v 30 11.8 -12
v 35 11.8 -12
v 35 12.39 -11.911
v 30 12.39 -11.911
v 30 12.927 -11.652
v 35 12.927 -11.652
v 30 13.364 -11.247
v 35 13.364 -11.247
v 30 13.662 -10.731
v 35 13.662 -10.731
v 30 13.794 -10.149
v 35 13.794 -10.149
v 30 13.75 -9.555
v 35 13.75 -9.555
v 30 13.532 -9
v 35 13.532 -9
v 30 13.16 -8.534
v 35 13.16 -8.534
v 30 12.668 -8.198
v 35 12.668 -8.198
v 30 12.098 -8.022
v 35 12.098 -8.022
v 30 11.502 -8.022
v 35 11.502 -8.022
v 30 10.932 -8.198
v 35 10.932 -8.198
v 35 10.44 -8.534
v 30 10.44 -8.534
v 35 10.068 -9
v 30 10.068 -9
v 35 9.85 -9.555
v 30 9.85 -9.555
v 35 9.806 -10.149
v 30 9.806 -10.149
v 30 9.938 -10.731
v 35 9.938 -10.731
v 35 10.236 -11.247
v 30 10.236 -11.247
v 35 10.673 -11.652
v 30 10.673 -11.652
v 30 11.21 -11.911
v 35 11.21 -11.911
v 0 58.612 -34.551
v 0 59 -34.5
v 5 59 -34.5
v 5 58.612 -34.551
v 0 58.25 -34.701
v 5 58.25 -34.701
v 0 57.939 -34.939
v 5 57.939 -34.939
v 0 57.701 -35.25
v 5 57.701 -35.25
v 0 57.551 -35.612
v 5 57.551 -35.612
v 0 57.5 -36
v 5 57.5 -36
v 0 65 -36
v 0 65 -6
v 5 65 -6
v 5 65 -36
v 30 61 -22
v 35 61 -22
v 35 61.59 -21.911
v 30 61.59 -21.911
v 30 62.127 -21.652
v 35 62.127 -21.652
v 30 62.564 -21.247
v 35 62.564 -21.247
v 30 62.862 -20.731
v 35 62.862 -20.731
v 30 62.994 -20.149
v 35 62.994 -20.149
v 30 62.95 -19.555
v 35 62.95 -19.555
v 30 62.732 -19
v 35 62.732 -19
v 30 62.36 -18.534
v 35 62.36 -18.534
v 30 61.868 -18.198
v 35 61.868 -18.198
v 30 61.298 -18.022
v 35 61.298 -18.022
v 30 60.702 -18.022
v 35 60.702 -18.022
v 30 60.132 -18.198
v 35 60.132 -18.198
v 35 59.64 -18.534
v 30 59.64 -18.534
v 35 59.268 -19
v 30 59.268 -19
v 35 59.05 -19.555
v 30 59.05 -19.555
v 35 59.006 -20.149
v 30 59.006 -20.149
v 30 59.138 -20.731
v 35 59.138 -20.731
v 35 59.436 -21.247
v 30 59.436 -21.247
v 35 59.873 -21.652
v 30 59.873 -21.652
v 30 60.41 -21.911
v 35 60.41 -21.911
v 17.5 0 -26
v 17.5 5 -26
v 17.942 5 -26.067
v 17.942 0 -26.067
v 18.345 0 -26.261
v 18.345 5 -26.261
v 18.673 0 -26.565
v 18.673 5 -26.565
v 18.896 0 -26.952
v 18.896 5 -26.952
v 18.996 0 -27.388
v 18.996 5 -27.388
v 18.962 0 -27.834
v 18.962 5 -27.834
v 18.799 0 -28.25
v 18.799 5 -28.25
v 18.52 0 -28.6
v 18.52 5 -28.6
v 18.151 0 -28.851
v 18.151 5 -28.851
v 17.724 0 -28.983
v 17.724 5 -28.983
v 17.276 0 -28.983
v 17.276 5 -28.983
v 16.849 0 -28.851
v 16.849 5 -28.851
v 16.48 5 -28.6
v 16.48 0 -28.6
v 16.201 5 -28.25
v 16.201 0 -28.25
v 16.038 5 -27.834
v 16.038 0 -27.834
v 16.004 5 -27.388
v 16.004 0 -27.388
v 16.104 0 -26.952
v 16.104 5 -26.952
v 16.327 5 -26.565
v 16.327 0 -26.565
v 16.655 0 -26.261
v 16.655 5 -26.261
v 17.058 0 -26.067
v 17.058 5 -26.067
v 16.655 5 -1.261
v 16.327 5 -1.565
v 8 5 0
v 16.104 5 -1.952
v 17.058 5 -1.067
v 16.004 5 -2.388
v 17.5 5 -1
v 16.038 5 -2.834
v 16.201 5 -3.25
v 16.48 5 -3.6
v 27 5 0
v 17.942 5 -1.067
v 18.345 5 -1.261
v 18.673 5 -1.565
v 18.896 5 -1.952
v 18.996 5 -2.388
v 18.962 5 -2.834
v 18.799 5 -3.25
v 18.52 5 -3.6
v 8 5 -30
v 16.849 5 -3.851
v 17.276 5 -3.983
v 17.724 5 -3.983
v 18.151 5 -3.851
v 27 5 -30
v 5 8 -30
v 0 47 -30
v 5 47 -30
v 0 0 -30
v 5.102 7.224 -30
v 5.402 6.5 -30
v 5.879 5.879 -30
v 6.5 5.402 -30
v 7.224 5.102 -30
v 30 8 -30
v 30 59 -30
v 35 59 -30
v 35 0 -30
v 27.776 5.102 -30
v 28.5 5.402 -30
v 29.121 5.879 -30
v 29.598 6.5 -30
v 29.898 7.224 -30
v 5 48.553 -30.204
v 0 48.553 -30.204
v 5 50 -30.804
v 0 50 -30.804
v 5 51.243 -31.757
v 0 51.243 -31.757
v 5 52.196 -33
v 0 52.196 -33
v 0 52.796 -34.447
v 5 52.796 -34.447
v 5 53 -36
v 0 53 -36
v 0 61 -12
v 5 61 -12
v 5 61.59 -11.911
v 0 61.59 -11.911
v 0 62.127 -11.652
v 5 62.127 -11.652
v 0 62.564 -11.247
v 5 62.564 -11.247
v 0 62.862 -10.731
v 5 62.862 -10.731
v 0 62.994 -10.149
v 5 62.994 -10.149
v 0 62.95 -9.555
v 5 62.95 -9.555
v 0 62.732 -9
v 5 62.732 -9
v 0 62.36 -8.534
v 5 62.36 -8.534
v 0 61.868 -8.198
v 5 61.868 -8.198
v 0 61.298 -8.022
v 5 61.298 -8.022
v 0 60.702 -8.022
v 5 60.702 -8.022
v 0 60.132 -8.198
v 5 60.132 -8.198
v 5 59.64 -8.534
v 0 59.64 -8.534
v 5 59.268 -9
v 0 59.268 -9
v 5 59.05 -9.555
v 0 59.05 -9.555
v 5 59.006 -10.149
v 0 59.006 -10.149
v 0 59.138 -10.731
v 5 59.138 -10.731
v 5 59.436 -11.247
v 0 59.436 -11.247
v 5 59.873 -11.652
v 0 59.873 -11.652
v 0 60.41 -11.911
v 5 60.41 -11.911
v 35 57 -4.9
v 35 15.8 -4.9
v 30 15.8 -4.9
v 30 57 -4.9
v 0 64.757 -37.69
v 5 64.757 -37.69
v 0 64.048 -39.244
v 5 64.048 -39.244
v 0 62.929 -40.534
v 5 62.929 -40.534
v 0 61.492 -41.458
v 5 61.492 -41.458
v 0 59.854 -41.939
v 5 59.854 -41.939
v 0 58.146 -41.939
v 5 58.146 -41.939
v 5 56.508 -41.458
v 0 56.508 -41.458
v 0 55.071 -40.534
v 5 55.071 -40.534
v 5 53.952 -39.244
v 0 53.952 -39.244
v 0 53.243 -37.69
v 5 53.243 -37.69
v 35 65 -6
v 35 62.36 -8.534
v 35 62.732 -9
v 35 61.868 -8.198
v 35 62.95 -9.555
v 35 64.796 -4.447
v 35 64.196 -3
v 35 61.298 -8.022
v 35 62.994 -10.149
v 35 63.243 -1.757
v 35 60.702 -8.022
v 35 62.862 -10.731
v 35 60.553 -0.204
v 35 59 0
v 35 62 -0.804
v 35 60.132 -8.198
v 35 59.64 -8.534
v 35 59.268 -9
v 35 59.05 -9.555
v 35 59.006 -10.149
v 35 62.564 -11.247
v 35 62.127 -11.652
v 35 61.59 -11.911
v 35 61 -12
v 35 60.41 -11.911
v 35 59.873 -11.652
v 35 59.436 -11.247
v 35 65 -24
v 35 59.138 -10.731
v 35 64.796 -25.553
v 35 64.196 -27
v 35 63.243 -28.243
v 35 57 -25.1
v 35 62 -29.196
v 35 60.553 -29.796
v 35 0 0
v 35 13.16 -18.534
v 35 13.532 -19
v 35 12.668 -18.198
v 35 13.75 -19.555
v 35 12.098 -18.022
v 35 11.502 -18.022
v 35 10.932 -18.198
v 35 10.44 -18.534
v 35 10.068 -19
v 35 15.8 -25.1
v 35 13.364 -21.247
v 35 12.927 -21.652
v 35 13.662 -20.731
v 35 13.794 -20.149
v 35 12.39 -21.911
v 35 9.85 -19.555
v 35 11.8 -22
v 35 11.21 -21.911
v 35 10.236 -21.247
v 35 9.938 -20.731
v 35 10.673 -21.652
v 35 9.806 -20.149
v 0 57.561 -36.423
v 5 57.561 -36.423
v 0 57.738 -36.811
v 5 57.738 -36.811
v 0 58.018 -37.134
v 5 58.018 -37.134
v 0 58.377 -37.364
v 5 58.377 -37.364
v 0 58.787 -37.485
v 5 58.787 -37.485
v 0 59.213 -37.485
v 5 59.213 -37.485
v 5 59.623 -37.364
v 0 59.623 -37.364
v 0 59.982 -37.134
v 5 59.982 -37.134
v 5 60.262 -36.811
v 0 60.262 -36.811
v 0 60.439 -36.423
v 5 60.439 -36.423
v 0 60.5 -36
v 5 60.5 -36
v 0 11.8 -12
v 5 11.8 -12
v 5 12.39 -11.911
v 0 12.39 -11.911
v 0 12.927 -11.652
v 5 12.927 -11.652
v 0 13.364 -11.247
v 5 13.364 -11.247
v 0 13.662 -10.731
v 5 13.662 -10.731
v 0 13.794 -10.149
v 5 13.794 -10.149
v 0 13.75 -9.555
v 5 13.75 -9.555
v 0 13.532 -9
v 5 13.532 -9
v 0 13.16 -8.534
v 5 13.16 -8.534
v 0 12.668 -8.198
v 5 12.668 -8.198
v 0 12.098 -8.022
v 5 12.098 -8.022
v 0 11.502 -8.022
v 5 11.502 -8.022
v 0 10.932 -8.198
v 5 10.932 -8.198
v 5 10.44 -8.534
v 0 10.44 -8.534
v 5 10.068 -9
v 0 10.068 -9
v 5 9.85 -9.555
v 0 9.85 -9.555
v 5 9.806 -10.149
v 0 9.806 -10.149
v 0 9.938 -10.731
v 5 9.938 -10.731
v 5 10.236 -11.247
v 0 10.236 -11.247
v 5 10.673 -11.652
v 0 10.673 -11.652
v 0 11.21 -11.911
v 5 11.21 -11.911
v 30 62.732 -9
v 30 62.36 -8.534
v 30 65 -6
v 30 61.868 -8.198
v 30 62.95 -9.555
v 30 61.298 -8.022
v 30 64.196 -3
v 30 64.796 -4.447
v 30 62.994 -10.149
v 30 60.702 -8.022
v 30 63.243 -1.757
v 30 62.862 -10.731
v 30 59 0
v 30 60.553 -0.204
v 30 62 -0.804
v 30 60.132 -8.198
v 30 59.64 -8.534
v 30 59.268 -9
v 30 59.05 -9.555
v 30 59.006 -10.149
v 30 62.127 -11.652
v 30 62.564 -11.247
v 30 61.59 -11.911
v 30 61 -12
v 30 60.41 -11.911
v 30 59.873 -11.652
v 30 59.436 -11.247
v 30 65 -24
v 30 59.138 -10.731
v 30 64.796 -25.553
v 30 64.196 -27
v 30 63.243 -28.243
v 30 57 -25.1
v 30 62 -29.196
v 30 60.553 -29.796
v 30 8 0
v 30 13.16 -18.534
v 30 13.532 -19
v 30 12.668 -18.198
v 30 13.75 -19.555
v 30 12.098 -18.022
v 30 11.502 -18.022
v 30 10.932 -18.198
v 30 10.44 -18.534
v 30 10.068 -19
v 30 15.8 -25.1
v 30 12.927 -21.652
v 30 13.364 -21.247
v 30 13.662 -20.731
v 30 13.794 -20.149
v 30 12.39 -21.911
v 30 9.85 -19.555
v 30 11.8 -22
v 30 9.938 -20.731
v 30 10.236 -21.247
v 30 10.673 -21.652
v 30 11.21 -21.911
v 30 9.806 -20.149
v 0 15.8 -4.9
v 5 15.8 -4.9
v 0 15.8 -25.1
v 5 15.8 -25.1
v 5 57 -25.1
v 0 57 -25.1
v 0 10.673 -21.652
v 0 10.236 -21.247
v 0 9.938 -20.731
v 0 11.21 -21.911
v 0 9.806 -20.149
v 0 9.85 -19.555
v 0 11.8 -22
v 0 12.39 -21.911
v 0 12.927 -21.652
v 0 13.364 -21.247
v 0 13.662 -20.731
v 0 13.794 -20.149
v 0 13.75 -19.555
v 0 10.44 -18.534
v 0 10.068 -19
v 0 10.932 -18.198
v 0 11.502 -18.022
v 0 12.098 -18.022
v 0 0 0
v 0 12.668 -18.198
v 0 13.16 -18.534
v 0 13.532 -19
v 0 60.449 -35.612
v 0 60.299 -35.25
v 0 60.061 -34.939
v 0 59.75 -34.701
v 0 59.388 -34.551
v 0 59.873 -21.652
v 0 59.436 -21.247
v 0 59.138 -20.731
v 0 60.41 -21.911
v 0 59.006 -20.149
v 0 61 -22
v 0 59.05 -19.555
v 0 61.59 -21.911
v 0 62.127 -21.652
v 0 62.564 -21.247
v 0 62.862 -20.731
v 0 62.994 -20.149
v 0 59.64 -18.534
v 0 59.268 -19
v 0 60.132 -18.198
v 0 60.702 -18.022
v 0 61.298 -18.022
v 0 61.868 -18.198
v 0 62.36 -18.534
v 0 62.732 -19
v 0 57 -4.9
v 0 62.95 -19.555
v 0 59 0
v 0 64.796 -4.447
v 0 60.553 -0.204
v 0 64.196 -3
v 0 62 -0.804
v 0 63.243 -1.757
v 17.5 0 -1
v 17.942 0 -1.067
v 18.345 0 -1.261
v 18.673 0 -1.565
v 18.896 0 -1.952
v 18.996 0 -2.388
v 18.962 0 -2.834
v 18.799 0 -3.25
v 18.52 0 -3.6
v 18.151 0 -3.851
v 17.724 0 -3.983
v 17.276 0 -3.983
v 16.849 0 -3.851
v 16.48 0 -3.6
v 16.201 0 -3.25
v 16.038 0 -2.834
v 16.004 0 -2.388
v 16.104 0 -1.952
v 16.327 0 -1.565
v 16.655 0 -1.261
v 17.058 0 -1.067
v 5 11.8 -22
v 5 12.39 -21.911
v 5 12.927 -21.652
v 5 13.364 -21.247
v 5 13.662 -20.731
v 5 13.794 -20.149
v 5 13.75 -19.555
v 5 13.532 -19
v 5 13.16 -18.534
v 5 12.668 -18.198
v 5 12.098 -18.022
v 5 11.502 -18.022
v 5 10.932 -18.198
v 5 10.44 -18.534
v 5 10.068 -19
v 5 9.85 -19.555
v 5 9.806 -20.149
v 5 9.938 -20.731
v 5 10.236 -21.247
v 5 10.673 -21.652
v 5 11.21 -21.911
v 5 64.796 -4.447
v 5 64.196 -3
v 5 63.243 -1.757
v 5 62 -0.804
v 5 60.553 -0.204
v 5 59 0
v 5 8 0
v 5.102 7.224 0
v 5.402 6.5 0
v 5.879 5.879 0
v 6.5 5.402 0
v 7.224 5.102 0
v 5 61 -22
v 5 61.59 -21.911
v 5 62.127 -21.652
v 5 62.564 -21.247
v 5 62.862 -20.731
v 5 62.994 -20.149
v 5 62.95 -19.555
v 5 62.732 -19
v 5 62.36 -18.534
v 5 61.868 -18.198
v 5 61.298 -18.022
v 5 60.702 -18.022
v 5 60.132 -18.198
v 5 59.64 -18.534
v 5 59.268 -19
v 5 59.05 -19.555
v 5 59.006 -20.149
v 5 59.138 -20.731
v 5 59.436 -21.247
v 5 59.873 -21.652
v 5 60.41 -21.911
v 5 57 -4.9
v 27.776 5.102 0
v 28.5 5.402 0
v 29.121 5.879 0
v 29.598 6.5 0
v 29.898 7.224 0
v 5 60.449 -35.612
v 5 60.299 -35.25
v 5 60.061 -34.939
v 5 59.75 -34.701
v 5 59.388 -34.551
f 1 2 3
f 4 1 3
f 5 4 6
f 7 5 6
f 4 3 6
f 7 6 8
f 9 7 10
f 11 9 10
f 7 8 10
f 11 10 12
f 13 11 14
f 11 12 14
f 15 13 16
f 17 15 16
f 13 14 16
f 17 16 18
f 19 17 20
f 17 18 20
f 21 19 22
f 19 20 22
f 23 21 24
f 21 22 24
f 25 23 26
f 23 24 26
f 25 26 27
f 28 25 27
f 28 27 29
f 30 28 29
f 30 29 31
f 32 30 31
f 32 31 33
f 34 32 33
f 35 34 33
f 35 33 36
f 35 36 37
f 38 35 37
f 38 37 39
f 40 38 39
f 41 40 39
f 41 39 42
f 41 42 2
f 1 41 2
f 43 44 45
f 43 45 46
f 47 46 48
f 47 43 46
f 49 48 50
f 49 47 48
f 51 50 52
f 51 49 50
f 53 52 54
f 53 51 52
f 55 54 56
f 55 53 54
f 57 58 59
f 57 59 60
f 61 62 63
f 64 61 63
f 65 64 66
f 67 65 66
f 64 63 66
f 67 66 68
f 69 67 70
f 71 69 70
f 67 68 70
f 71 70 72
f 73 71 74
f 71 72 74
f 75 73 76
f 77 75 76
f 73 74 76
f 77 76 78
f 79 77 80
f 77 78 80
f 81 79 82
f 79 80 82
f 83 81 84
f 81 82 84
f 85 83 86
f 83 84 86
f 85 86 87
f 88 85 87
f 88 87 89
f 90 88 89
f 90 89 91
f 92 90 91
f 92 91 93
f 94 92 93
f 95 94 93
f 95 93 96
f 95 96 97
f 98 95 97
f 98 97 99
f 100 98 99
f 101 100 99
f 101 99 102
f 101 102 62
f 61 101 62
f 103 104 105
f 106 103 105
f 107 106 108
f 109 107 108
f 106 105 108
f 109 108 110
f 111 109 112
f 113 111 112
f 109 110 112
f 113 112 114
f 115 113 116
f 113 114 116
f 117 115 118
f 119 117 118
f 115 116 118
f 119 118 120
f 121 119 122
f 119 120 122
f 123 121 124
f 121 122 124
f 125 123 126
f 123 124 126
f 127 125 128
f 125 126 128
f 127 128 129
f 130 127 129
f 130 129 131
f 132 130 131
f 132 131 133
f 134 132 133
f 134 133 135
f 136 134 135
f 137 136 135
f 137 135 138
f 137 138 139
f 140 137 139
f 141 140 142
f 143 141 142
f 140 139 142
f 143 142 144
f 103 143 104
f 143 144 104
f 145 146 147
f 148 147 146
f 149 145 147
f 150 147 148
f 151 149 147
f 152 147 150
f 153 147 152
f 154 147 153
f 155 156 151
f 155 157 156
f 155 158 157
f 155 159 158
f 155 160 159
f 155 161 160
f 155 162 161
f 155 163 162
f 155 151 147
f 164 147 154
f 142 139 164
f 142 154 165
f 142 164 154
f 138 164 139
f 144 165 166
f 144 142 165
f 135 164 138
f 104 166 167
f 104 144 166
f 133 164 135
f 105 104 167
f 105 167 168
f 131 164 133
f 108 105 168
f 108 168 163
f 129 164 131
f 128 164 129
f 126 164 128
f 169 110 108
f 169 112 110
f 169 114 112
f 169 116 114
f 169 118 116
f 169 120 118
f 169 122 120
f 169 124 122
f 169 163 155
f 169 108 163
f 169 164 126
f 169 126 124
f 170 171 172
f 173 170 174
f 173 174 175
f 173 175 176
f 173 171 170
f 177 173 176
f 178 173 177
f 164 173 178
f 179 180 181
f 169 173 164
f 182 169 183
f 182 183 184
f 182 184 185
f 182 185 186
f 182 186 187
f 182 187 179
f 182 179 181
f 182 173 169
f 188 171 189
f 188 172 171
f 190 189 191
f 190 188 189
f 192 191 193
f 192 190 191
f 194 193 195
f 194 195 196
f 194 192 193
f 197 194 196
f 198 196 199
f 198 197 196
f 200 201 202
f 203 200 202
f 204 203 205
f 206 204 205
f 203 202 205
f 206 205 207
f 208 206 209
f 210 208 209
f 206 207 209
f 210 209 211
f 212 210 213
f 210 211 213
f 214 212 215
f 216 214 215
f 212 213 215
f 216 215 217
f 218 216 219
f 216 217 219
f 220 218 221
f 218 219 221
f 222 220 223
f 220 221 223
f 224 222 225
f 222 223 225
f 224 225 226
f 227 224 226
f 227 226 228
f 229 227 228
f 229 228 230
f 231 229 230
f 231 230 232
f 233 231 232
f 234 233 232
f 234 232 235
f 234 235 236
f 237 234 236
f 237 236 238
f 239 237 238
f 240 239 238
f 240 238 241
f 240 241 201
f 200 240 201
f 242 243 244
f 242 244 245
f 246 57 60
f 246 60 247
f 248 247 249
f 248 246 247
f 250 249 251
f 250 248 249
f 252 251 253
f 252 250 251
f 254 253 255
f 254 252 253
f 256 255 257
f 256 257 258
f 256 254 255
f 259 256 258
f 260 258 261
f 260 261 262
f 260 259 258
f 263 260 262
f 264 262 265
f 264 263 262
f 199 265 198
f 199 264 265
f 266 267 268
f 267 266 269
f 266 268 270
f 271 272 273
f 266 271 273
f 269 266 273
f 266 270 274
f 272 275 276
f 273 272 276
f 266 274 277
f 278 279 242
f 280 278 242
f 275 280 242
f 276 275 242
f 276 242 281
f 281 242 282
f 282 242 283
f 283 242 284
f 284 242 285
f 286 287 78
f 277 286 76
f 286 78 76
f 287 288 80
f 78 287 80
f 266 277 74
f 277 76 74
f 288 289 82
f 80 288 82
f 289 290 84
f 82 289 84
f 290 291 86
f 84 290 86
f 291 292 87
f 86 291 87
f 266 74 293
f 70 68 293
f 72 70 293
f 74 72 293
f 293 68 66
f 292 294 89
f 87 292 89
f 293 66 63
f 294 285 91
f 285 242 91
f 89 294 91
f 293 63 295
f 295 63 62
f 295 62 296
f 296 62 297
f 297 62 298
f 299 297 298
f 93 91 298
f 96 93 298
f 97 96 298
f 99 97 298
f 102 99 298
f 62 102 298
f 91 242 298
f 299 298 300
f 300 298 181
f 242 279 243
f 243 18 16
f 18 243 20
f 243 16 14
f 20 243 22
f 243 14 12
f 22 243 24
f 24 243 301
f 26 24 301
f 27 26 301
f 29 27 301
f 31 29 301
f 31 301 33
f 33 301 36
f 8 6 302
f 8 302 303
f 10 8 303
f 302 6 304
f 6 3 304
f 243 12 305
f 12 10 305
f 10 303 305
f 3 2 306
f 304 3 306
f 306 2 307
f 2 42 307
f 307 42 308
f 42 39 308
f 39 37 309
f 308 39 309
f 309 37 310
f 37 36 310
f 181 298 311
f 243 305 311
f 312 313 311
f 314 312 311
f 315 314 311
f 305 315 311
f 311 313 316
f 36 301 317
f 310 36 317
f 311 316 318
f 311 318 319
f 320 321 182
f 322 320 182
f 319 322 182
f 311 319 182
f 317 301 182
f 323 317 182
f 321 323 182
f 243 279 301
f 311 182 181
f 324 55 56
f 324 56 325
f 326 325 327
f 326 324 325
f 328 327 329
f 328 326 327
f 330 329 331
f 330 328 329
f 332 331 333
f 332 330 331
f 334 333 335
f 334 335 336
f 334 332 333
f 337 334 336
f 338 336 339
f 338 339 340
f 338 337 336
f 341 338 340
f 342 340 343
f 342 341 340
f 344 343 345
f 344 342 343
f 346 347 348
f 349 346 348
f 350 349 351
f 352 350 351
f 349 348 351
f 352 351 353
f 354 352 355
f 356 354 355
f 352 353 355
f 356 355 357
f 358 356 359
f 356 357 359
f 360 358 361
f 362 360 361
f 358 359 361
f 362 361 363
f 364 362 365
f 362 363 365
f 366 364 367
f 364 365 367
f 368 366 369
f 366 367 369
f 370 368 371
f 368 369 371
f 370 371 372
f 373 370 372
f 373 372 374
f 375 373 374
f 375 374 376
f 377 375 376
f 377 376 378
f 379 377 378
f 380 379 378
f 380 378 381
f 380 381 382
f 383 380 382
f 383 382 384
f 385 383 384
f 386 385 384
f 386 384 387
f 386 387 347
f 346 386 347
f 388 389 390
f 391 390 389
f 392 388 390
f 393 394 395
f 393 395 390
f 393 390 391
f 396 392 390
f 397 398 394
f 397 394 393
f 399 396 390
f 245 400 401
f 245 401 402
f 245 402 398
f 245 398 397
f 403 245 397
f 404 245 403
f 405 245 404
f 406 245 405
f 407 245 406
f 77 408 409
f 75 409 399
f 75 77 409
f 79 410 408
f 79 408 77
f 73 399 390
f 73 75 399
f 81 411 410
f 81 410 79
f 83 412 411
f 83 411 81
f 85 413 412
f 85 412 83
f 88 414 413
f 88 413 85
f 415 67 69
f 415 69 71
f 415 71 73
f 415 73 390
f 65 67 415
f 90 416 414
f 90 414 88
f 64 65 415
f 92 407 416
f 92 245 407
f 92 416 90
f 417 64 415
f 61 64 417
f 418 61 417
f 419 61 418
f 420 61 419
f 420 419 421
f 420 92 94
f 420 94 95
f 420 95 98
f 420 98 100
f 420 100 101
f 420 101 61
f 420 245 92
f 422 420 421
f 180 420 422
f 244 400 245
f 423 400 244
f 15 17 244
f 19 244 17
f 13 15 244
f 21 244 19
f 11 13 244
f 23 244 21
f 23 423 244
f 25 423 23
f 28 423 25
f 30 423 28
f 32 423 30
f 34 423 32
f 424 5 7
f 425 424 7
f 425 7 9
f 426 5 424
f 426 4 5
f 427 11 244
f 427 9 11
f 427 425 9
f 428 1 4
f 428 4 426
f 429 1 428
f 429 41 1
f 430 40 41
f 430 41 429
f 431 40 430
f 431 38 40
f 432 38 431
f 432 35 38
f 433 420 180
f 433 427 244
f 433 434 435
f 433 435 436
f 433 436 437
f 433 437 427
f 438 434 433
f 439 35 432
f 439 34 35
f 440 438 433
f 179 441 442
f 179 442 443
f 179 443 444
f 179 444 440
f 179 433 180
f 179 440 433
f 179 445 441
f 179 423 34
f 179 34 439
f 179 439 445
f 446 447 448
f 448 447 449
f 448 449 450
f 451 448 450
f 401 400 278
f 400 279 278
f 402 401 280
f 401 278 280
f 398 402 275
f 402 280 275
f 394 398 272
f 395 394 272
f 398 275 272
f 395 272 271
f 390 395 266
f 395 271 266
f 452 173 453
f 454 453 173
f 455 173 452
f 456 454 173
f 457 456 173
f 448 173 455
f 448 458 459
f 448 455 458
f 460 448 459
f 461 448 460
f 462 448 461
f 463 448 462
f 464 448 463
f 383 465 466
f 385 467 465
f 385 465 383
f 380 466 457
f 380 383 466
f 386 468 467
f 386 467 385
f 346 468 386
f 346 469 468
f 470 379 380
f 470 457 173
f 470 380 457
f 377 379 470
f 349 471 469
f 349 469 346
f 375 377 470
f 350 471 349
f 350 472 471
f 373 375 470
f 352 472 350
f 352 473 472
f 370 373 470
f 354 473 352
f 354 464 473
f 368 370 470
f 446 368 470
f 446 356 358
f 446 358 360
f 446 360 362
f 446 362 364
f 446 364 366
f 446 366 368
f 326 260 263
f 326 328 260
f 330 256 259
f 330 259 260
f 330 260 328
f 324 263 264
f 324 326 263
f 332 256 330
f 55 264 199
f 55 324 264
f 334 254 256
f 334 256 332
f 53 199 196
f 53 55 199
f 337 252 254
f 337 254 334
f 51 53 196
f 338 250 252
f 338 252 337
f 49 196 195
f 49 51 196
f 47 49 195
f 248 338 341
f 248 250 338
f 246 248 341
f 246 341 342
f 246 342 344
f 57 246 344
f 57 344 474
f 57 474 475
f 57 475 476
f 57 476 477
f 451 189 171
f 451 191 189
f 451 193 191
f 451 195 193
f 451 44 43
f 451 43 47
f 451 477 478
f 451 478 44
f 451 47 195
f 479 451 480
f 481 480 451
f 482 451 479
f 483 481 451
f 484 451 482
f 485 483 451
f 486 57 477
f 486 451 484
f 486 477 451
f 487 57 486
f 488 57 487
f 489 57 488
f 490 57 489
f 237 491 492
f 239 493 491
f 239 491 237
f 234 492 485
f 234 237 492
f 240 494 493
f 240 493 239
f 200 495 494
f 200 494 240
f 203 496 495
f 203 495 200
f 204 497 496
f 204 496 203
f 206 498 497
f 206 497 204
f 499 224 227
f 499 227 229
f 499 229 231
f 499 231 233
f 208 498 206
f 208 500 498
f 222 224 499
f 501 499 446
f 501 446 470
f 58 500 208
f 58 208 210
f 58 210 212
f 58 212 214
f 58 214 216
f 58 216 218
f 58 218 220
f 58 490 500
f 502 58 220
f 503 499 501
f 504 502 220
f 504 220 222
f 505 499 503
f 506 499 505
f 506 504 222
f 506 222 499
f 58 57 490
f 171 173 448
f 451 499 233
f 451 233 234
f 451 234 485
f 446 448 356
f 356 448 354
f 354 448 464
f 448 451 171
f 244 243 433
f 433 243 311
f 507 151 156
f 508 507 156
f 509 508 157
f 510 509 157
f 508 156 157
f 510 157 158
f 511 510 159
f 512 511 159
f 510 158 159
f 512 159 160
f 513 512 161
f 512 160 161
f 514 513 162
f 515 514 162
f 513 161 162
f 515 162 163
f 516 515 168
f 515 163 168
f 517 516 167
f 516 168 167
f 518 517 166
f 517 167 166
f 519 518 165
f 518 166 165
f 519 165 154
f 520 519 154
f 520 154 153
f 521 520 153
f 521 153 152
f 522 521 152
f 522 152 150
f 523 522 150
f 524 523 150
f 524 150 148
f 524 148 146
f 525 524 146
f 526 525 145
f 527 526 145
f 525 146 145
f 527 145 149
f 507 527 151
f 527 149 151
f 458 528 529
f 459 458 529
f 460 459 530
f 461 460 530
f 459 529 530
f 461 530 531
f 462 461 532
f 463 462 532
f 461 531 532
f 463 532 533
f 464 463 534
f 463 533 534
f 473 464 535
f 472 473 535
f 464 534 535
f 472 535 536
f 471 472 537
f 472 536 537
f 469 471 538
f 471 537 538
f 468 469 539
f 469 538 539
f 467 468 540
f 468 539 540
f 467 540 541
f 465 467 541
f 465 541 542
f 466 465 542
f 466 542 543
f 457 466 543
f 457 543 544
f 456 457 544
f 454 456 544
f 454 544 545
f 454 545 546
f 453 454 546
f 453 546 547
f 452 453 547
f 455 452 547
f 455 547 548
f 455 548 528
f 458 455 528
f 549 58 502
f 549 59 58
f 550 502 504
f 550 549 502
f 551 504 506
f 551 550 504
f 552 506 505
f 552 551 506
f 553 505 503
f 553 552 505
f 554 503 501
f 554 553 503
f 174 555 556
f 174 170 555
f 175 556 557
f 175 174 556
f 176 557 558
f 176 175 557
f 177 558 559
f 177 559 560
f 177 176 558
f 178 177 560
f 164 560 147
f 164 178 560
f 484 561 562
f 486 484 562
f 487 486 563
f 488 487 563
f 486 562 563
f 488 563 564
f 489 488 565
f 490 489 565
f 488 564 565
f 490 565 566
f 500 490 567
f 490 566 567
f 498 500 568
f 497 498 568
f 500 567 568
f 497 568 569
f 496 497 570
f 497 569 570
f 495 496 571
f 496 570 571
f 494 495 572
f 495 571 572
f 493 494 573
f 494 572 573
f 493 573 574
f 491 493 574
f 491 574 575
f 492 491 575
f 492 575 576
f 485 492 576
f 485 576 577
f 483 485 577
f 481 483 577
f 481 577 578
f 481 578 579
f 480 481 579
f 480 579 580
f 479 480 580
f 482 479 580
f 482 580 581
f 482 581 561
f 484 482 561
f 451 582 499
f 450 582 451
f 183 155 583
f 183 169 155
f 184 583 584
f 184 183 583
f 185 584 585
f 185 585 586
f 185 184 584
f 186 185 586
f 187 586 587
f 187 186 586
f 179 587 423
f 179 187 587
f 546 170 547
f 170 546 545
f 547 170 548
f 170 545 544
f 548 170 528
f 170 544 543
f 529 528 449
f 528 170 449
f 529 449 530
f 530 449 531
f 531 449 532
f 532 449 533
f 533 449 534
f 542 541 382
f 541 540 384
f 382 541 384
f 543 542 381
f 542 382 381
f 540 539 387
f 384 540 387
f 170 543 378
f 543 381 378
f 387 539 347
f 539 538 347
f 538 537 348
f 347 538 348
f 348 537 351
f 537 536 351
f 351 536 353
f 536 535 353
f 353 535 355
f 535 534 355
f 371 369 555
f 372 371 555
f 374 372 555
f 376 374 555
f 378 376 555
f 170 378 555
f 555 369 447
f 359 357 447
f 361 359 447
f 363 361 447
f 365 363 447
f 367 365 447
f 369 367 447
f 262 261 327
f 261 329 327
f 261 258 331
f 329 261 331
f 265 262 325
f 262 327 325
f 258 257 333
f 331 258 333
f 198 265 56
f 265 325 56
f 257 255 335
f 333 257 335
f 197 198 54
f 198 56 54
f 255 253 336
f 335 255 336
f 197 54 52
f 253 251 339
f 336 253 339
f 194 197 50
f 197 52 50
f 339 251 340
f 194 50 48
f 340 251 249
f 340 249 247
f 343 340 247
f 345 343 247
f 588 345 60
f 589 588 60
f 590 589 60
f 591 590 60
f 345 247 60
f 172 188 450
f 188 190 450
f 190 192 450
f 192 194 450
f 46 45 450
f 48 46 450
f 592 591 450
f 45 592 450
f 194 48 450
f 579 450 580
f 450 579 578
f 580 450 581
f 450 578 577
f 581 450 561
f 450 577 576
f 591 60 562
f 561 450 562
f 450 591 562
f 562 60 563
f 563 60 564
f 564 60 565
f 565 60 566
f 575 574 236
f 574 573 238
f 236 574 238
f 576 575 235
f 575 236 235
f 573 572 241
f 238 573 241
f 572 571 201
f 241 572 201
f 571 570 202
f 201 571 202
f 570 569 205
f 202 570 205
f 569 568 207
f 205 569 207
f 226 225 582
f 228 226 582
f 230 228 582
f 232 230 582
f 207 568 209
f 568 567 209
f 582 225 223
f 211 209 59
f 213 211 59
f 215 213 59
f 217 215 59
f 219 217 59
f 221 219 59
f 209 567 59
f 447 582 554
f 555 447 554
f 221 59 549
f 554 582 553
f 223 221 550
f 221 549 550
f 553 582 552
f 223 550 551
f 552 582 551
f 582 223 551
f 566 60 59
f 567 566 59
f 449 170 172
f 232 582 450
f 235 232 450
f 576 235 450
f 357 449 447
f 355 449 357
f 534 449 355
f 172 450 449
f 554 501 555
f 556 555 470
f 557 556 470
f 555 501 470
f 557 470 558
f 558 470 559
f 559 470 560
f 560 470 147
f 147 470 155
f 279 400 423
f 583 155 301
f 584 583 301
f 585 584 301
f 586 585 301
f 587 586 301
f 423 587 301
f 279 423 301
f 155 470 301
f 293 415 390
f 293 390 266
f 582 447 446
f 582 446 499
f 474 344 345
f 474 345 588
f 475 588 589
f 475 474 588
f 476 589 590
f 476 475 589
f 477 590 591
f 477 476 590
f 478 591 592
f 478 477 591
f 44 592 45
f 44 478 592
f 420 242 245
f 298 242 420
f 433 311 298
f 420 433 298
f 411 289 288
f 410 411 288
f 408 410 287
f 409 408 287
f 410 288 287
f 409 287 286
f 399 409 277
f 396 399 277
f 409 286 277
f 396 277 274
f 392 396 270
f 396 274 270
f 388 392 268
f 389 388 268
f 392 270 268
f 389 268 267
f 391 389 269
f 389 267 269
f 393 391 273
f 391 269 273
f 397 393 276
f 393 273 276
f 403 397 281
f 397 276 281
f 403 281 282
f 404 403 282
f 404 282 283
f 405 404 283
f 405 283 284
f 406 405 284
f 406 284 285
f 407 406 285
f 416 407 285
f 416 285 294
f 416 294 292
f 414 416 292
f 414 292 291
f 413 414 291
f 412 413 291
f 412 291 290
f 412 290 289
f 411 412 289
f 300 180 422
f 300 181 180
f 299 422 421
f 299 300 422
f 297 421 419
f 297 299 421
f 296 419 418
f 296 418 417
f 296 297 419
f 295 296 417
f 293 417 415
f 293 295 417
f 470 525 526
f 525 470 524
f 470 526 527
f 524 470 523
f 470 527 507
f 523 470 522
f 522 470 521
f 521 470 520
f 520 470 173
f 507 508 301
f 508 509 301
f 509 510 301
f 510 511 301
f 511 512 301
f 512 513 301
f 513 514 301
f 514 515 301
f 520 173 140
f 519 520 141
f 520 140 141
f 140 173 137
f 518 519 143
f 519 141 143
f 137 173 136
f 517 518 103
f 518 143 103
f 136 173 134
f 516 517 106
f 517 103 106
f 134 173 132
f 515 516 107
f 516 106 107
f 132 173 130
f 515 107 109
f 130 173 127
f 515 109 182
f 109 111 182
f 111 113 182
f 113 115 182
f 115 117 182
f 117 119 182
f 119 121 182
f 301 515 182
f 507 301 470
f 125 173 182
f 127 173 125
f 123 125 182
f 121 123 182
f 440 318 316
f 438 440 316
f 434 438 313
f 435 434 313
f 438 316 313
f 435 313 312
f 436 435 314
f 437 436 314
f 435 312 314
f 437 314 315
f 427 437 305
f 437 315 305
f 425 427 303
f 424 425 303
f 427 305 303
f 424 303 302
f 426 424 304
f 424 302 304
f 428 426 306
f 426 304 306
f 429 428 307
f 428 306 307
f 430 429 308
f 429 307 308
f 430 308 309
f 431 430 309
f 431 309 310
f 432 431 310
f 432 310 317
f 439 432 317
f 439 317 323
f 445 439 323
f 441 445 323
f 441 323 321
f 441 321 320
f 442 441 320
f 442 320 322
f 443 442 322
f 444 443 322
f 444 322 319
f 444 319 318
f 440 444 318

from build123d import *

# Parameters (mm, degrees)
SKETCH1_W           = 35
SKETCH1_H           = 30
BOSS_EXTRUDE3_DEPTH = 5
SKETCH5_W           = 5
SKETCH5_H           = 30
BOSS_EXTRUDE4_DEPTH = 60
SKETCH6_R           = 2
SKETCH6_W           = 20.2
SKETCH6_H           = 41.2
CUT_EXTRUDE1_DEPTH  = 60
FILLET2_R           = 3
BOSS_EXTRUDE7_DEPTH = 5
FILLET3_R           = 6
SKETCH10_R          = 1.5
CUT_EXTRUDE2_DEPTH  = 5
FILLET4_R           = 6


with BuildPart() as part:
    # Sketch1 → Boss-Extrude3 (new body)
    with BuildSketch(Plane(origin=(0, 0, 0), x_dir=(1, 0, 0), z_dir=(0, 1, 0))):
        with Locations((17.5, 15)):
            Rectangle(SKETCH1_W, SKETCH1_H)
    extrude(amount=BOSS_EXTRUDE3_DEPTH)

    # Sketch5 → Boss-Extrude4 (add)
    with BuildSketch(Plane(origin=(0, 5, 0), x_dir=(1, 0, 0), z_dir=(0, 1, 0))):
        with Locations((2.5, 15)):
            Rectangle(SKETCH5_W, SKETCH5_H)
        with Locations((32.5, 15)):
            Rectangle(SKETCH5_W, SKETCH5_H)
    extrude(amount=BOSS_EXTRUDE4_DEPTH)

    # Sketch6 → Cut-Extrude1 (cut)
    with BuildSketch(Plane(origin=(35, 0, 0), x_dir=(0, 0, -1), z_dir=(1, 0, 0))):
        with Locations((10, 61)):
            Circle(SKETCH6_R)
        with Locations((20, 61)):
            Circle(SKETCH6_R)
        with Locations((10, 11.8)):
            Circle(SKETCH6_R)
        with Locations((20, 11.8)):
            Circle(SKETCH6_R)
        with Locations((15, 36.4)):
            Rectangle(SKETCH6_W, SKETCH6_H)
    extrude(amount=-CUT_EXTRUDE1_DEPTH, mode=Mode.SUBTRACT)

    # Fillet2
    fillet2_edges = [part.edges().sort_by_distance(p)[0] for p in [
        (5, 5, -15),
        (30, 5, -15),
    ]]
    fillet(fillet2_edges, radius=FILLET2_R)

    # Sketch8 → Boss-Extrude7 (add)
    with BuildSketch(Plane.ZY):
        with BuildLine():
            ThreePointArc((-30, 59), (-31.757359313, 63.242640687), (-36, 65))
            Line((-36, 65), (-36, 60.5))
            ThreePointArc((-36, 60.5), (-34.939339828, 60.060660172), (-34.5, 59))
            ThreePointArc((-34.5, 59), (-34.939339828, 57.939339828), (-36, 57.5))
            Line((-36, 57.5), (-36, 53))
            ThreePointArc((-36, 53), (-31.757359313, 54.757359313), (-30, 59))
        make_face()
        with BuildLine():
            Line((-36, 60.5), (-36, 65))
            ThreePointArc((-36, 65), (-42, 59), (-36, 53))
            Line((-36, 53), (-36, 57.5))
            ThreePointArc((-36, 57.5), (-37.5, 59), (-36, 60.5))
        make_face()
        with BuildLine():
            Line((-30, 59), (-30, 65))
            Line((-30, 65), (-36, 65))
            ThreePointArc((-36, 65), (-31.757359313, 63.242640687), (-30, 59))
        make_face()
        with BuildLine():
            Line((-30, 53), (-30, 59))
            ThreePointArc((-30, 59), (-31.757359313, 54.757359313), (-36, 53))
            Line((-36, 53), (-30, 53))
        make_face()
    extrude(amount=-BOSS_EXTRUDE7_DEPTH)

    # Fillet3
    fillet3_edges = [part.edges().sort_by_distance(p)[0] for p in [
        (2.5, 53, -30),
    ]]
    fillet(fillet3_edges, radius=FILLET3_R - 0.0001)  # a hair under: the kernel refuses the full size

    # Sketch10 → Cut-Extrude2 (cut)
    with BuildSketch(Plane(origin=(0, 5, 0), x_dir=(1, 0, 0), z_dir=(0, 1, 0))):
        with Locations(Location((17.5, 27.5, 0), (0, 0, 270))):
            Circle(SKETCH10_R)
        with Locations(Location((17.5, 2.5, 0), (0, 0, 270))):
            Circle(SKETCH10_R)
    extrude(amount=-CUT_EXTRUDE2_DEPTH, mode=Mode.SUBTRACT)

    # Fillet4
    fillet4_edges = [part.edges().sort_by_distance(p)[0] for p in [
        (2.5, 65, 0),
        (32.5, 65, -30),
        (32.5, 65, 0),
    ]]
    fillet(fillet4_edges, radius=FILLET4_R)


solid = part.part
